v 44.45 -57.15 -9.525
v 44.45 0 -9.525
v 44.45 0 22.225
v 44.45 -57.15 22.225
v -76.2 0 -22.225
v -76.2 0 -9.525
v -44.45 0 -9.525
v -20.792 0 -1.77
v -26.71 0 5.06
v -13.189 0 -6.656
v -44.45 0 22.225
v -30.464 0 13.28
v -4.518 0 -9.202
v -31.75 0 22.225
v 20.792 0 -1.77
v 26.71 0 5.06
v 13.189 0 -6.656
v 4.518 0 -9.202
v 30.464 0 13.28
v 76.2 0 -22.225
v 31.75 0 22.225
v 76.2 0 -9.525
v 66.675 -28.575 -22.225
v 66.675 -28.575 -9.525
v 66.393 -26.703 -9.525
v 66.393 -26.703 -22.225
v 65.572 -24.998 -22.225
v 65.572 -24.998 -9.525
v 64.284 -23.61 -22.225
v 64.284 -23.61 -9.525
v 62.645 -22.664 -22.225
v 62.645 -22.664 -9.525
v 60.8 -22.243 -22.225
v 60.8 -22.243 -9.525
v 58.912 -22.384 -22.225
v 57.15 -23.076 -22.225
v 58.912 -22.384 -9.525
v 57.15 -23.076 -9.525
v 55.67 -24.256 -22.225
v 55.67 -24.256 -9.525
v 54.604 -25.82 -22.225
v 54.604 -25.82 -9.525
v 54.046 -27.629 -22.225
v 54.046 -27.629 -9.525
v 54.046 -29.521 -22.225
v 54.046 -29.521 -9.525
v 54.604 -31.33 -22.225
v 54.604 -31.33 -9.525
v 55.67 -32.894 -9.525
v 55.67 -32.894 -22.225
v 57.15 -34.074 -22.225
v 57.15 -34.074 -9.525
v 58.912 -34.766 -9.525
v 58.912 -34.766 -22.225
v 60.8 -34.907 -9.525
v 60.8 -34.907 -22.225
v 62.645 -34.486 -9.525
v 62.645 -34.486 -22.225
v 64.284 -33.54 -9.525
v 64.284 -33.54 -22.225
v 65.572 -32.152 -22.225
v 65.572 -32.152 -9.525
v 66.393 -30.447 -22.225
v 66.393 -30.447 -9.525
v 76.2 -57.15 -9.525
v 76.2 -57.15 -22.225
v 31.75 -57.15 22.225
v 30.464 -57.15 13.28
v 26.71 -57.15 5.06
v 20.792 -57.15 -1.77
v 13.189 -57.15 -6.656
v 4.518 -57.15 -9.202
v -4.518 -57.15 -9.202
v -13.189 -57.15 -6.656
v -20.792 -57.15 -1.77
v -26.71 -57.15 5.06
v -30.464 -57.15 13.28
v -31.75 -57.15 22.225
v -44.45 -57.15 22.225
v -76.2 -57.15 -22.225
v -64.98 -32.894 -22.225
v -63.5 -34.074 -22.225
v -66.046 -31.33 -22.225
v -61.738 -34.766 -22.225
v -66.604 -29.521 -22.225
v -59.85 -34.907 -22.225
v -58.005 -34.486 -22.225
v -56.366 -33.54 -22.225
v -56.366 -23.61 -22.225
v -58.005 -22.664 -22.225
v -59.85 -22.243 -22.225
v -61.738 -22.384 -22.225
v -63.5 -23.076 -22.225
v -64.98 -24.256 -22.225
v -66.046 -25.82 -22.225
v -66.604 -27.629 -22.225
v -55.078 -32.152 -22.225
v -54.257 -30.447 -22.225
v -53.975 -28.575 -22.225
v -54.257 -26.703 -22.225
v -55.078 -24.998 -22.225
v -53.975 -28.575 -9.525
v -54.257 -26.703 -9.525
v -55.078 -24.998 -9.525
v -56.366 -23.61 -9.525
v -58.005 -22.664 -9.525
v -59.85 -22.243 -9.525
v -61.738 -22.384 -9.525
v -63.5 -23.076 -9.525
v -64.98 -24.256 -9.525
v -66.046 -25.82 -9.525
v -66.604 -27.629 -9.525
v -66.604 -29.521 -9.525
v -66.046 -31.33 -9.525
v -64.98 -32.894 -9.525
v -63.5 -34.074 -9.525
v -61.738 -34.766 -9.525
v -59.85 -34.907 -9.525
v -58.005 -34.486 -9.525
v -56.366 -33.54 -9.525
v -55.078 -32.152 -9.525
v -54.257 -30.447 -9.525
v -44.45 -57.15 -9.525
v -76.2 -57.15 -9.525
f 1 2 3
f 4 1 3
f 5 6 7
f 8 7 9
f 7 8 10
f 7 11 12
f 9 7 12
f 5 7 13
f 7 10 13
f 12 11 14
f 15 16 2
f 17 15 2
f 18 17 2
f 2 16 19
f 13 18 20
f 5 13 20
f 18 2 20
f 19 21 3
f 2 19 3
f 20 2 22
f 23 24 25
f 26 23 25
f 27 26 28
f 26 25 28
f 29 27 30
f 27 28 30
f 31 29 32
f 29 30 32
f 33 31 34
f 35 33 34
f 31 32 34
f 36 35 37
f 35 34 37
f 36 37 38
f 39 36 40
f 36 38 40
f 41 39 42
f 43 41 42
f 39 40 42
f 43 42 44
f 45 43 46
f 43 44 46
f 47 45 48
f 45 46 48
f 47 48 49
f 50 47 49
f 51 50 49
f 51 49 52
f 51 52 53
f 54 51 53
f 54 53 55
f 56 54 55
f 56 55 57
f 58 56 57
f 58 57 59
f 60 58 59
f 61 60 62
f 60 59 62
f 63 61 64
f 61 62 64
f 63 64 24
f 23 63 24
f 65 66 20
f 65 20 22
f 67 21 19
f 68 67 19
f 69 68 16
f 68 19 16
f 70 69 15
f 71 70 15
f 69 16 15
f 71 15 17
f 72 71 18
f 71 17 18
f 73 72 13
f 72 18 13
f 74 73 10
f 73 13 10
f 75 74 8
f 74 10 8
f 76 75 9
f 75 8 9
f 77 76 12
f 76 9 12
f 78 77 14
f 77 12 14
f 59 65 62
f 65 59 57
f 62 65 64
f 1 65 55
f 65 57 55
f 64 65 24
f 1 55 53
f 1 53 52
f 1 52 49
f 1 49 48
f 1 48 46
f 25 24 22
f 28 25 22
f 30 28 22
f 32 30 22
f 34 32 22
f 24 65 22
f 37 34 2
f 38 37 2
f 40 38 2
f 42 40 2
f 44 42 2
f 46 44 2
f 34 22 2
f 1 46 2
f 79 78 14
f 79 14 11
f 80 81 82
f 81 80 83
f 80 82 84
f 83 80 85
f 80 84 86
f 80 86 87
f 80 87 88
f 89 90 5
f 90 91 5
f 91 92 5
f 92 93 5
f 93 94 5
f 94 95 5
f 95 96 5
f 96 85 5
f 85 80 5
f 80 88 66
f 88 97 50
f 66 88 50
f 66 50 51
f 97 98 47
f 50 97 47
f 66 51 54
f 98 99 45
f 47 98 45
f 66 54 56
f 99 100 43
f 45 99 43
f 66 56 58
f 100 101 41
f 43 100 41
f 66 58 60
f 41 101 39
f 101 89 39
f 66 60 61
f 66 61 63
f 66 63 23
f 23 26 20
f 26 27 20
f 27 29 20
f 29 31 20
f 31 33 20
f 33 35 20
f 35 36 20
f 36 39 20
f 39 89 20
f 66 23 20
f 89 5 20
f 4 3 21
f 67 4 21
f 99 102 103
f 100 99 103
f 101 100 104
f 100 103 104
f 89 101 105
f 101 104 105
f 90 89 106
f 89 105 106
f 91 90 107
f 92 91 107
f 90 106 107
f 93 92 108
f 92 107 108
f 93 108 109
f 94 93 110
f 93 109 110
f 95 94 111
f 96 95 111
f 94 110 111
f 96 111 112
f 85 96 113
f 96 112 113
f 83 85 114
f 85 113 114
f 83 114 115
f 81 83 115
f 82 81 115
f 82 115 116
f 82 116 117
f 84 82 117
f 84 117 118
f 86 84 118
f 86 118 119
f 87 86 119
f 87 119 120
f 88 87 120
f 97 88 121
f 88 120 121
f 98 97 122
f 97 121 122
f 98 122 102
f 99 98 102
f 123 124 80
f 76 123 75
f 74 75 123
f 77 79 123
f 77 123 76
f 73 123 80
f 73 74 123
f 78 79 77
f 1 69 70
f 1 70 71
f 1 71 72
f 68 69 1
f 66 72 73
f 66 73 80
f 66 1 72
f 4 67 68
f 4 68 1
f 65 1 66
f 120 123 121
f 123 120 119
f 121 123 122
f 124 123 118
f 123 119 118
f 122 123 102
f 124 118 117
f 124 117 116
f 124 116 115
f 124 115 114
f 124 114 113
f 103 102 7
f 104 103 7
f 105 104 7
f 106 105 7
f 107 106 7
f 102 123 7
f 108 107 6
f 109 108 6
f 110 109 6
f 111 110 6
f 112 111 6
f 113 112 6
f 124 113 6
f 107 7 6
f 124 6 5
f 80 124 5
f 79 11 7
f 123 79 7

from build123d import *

# Parameters (mm, degrees)
F1_DEPTH = 57.15
F3_R     = 6.35
F2_R     = 6.35
F4_DEPTH = 12.7


with BuildPart() as f1:
    # F0 (on Front) → F1 (new body)
    with BuildSketch(Plane.XZ):
        with BuildLine():
            Line((-76.2, -22.225), (76.2, -22.225))
            Line((76.2, -22.225), (76.2, -9.525))
            Line((76.2, -9.525), (44.45, -9.525))
            Line((44.45, -9.525), (44.45, 22.225))
            Line((44.45, 22.225), (31.75, 22.225))
            ThreePointArc((31.75, 22.225), (0, -9.525), (-31.75, 22.225))
            Line((-31.75, 22.225), (-44.45, 22.225))
            Line((-44.45, 22.225), (-44.45, -9.525))
            Line((-44.45, -9.525), (-76.2, -9.525))
            Line((-76.2, -9.525), (-76.2, -22.225))
        make_face()
    extrude(amount=F1_DEPTH)

    # F3 (on face) + F2 (on face) → F4 (cut)
    with BuildSketch(Plane.XY.offset(-9.525)):
        with Locations((-60.325, -28.575)):
            Circle(F3_R)
    with BuildSketch(Plane.XY.offset(-9.525)):
        with Locations((60.325, -28.575)):
            Circle(F2_R)
    extrude(amount=-F4_DEPTH, mode=Mode.SUBTRACT)


solid = f1.part
